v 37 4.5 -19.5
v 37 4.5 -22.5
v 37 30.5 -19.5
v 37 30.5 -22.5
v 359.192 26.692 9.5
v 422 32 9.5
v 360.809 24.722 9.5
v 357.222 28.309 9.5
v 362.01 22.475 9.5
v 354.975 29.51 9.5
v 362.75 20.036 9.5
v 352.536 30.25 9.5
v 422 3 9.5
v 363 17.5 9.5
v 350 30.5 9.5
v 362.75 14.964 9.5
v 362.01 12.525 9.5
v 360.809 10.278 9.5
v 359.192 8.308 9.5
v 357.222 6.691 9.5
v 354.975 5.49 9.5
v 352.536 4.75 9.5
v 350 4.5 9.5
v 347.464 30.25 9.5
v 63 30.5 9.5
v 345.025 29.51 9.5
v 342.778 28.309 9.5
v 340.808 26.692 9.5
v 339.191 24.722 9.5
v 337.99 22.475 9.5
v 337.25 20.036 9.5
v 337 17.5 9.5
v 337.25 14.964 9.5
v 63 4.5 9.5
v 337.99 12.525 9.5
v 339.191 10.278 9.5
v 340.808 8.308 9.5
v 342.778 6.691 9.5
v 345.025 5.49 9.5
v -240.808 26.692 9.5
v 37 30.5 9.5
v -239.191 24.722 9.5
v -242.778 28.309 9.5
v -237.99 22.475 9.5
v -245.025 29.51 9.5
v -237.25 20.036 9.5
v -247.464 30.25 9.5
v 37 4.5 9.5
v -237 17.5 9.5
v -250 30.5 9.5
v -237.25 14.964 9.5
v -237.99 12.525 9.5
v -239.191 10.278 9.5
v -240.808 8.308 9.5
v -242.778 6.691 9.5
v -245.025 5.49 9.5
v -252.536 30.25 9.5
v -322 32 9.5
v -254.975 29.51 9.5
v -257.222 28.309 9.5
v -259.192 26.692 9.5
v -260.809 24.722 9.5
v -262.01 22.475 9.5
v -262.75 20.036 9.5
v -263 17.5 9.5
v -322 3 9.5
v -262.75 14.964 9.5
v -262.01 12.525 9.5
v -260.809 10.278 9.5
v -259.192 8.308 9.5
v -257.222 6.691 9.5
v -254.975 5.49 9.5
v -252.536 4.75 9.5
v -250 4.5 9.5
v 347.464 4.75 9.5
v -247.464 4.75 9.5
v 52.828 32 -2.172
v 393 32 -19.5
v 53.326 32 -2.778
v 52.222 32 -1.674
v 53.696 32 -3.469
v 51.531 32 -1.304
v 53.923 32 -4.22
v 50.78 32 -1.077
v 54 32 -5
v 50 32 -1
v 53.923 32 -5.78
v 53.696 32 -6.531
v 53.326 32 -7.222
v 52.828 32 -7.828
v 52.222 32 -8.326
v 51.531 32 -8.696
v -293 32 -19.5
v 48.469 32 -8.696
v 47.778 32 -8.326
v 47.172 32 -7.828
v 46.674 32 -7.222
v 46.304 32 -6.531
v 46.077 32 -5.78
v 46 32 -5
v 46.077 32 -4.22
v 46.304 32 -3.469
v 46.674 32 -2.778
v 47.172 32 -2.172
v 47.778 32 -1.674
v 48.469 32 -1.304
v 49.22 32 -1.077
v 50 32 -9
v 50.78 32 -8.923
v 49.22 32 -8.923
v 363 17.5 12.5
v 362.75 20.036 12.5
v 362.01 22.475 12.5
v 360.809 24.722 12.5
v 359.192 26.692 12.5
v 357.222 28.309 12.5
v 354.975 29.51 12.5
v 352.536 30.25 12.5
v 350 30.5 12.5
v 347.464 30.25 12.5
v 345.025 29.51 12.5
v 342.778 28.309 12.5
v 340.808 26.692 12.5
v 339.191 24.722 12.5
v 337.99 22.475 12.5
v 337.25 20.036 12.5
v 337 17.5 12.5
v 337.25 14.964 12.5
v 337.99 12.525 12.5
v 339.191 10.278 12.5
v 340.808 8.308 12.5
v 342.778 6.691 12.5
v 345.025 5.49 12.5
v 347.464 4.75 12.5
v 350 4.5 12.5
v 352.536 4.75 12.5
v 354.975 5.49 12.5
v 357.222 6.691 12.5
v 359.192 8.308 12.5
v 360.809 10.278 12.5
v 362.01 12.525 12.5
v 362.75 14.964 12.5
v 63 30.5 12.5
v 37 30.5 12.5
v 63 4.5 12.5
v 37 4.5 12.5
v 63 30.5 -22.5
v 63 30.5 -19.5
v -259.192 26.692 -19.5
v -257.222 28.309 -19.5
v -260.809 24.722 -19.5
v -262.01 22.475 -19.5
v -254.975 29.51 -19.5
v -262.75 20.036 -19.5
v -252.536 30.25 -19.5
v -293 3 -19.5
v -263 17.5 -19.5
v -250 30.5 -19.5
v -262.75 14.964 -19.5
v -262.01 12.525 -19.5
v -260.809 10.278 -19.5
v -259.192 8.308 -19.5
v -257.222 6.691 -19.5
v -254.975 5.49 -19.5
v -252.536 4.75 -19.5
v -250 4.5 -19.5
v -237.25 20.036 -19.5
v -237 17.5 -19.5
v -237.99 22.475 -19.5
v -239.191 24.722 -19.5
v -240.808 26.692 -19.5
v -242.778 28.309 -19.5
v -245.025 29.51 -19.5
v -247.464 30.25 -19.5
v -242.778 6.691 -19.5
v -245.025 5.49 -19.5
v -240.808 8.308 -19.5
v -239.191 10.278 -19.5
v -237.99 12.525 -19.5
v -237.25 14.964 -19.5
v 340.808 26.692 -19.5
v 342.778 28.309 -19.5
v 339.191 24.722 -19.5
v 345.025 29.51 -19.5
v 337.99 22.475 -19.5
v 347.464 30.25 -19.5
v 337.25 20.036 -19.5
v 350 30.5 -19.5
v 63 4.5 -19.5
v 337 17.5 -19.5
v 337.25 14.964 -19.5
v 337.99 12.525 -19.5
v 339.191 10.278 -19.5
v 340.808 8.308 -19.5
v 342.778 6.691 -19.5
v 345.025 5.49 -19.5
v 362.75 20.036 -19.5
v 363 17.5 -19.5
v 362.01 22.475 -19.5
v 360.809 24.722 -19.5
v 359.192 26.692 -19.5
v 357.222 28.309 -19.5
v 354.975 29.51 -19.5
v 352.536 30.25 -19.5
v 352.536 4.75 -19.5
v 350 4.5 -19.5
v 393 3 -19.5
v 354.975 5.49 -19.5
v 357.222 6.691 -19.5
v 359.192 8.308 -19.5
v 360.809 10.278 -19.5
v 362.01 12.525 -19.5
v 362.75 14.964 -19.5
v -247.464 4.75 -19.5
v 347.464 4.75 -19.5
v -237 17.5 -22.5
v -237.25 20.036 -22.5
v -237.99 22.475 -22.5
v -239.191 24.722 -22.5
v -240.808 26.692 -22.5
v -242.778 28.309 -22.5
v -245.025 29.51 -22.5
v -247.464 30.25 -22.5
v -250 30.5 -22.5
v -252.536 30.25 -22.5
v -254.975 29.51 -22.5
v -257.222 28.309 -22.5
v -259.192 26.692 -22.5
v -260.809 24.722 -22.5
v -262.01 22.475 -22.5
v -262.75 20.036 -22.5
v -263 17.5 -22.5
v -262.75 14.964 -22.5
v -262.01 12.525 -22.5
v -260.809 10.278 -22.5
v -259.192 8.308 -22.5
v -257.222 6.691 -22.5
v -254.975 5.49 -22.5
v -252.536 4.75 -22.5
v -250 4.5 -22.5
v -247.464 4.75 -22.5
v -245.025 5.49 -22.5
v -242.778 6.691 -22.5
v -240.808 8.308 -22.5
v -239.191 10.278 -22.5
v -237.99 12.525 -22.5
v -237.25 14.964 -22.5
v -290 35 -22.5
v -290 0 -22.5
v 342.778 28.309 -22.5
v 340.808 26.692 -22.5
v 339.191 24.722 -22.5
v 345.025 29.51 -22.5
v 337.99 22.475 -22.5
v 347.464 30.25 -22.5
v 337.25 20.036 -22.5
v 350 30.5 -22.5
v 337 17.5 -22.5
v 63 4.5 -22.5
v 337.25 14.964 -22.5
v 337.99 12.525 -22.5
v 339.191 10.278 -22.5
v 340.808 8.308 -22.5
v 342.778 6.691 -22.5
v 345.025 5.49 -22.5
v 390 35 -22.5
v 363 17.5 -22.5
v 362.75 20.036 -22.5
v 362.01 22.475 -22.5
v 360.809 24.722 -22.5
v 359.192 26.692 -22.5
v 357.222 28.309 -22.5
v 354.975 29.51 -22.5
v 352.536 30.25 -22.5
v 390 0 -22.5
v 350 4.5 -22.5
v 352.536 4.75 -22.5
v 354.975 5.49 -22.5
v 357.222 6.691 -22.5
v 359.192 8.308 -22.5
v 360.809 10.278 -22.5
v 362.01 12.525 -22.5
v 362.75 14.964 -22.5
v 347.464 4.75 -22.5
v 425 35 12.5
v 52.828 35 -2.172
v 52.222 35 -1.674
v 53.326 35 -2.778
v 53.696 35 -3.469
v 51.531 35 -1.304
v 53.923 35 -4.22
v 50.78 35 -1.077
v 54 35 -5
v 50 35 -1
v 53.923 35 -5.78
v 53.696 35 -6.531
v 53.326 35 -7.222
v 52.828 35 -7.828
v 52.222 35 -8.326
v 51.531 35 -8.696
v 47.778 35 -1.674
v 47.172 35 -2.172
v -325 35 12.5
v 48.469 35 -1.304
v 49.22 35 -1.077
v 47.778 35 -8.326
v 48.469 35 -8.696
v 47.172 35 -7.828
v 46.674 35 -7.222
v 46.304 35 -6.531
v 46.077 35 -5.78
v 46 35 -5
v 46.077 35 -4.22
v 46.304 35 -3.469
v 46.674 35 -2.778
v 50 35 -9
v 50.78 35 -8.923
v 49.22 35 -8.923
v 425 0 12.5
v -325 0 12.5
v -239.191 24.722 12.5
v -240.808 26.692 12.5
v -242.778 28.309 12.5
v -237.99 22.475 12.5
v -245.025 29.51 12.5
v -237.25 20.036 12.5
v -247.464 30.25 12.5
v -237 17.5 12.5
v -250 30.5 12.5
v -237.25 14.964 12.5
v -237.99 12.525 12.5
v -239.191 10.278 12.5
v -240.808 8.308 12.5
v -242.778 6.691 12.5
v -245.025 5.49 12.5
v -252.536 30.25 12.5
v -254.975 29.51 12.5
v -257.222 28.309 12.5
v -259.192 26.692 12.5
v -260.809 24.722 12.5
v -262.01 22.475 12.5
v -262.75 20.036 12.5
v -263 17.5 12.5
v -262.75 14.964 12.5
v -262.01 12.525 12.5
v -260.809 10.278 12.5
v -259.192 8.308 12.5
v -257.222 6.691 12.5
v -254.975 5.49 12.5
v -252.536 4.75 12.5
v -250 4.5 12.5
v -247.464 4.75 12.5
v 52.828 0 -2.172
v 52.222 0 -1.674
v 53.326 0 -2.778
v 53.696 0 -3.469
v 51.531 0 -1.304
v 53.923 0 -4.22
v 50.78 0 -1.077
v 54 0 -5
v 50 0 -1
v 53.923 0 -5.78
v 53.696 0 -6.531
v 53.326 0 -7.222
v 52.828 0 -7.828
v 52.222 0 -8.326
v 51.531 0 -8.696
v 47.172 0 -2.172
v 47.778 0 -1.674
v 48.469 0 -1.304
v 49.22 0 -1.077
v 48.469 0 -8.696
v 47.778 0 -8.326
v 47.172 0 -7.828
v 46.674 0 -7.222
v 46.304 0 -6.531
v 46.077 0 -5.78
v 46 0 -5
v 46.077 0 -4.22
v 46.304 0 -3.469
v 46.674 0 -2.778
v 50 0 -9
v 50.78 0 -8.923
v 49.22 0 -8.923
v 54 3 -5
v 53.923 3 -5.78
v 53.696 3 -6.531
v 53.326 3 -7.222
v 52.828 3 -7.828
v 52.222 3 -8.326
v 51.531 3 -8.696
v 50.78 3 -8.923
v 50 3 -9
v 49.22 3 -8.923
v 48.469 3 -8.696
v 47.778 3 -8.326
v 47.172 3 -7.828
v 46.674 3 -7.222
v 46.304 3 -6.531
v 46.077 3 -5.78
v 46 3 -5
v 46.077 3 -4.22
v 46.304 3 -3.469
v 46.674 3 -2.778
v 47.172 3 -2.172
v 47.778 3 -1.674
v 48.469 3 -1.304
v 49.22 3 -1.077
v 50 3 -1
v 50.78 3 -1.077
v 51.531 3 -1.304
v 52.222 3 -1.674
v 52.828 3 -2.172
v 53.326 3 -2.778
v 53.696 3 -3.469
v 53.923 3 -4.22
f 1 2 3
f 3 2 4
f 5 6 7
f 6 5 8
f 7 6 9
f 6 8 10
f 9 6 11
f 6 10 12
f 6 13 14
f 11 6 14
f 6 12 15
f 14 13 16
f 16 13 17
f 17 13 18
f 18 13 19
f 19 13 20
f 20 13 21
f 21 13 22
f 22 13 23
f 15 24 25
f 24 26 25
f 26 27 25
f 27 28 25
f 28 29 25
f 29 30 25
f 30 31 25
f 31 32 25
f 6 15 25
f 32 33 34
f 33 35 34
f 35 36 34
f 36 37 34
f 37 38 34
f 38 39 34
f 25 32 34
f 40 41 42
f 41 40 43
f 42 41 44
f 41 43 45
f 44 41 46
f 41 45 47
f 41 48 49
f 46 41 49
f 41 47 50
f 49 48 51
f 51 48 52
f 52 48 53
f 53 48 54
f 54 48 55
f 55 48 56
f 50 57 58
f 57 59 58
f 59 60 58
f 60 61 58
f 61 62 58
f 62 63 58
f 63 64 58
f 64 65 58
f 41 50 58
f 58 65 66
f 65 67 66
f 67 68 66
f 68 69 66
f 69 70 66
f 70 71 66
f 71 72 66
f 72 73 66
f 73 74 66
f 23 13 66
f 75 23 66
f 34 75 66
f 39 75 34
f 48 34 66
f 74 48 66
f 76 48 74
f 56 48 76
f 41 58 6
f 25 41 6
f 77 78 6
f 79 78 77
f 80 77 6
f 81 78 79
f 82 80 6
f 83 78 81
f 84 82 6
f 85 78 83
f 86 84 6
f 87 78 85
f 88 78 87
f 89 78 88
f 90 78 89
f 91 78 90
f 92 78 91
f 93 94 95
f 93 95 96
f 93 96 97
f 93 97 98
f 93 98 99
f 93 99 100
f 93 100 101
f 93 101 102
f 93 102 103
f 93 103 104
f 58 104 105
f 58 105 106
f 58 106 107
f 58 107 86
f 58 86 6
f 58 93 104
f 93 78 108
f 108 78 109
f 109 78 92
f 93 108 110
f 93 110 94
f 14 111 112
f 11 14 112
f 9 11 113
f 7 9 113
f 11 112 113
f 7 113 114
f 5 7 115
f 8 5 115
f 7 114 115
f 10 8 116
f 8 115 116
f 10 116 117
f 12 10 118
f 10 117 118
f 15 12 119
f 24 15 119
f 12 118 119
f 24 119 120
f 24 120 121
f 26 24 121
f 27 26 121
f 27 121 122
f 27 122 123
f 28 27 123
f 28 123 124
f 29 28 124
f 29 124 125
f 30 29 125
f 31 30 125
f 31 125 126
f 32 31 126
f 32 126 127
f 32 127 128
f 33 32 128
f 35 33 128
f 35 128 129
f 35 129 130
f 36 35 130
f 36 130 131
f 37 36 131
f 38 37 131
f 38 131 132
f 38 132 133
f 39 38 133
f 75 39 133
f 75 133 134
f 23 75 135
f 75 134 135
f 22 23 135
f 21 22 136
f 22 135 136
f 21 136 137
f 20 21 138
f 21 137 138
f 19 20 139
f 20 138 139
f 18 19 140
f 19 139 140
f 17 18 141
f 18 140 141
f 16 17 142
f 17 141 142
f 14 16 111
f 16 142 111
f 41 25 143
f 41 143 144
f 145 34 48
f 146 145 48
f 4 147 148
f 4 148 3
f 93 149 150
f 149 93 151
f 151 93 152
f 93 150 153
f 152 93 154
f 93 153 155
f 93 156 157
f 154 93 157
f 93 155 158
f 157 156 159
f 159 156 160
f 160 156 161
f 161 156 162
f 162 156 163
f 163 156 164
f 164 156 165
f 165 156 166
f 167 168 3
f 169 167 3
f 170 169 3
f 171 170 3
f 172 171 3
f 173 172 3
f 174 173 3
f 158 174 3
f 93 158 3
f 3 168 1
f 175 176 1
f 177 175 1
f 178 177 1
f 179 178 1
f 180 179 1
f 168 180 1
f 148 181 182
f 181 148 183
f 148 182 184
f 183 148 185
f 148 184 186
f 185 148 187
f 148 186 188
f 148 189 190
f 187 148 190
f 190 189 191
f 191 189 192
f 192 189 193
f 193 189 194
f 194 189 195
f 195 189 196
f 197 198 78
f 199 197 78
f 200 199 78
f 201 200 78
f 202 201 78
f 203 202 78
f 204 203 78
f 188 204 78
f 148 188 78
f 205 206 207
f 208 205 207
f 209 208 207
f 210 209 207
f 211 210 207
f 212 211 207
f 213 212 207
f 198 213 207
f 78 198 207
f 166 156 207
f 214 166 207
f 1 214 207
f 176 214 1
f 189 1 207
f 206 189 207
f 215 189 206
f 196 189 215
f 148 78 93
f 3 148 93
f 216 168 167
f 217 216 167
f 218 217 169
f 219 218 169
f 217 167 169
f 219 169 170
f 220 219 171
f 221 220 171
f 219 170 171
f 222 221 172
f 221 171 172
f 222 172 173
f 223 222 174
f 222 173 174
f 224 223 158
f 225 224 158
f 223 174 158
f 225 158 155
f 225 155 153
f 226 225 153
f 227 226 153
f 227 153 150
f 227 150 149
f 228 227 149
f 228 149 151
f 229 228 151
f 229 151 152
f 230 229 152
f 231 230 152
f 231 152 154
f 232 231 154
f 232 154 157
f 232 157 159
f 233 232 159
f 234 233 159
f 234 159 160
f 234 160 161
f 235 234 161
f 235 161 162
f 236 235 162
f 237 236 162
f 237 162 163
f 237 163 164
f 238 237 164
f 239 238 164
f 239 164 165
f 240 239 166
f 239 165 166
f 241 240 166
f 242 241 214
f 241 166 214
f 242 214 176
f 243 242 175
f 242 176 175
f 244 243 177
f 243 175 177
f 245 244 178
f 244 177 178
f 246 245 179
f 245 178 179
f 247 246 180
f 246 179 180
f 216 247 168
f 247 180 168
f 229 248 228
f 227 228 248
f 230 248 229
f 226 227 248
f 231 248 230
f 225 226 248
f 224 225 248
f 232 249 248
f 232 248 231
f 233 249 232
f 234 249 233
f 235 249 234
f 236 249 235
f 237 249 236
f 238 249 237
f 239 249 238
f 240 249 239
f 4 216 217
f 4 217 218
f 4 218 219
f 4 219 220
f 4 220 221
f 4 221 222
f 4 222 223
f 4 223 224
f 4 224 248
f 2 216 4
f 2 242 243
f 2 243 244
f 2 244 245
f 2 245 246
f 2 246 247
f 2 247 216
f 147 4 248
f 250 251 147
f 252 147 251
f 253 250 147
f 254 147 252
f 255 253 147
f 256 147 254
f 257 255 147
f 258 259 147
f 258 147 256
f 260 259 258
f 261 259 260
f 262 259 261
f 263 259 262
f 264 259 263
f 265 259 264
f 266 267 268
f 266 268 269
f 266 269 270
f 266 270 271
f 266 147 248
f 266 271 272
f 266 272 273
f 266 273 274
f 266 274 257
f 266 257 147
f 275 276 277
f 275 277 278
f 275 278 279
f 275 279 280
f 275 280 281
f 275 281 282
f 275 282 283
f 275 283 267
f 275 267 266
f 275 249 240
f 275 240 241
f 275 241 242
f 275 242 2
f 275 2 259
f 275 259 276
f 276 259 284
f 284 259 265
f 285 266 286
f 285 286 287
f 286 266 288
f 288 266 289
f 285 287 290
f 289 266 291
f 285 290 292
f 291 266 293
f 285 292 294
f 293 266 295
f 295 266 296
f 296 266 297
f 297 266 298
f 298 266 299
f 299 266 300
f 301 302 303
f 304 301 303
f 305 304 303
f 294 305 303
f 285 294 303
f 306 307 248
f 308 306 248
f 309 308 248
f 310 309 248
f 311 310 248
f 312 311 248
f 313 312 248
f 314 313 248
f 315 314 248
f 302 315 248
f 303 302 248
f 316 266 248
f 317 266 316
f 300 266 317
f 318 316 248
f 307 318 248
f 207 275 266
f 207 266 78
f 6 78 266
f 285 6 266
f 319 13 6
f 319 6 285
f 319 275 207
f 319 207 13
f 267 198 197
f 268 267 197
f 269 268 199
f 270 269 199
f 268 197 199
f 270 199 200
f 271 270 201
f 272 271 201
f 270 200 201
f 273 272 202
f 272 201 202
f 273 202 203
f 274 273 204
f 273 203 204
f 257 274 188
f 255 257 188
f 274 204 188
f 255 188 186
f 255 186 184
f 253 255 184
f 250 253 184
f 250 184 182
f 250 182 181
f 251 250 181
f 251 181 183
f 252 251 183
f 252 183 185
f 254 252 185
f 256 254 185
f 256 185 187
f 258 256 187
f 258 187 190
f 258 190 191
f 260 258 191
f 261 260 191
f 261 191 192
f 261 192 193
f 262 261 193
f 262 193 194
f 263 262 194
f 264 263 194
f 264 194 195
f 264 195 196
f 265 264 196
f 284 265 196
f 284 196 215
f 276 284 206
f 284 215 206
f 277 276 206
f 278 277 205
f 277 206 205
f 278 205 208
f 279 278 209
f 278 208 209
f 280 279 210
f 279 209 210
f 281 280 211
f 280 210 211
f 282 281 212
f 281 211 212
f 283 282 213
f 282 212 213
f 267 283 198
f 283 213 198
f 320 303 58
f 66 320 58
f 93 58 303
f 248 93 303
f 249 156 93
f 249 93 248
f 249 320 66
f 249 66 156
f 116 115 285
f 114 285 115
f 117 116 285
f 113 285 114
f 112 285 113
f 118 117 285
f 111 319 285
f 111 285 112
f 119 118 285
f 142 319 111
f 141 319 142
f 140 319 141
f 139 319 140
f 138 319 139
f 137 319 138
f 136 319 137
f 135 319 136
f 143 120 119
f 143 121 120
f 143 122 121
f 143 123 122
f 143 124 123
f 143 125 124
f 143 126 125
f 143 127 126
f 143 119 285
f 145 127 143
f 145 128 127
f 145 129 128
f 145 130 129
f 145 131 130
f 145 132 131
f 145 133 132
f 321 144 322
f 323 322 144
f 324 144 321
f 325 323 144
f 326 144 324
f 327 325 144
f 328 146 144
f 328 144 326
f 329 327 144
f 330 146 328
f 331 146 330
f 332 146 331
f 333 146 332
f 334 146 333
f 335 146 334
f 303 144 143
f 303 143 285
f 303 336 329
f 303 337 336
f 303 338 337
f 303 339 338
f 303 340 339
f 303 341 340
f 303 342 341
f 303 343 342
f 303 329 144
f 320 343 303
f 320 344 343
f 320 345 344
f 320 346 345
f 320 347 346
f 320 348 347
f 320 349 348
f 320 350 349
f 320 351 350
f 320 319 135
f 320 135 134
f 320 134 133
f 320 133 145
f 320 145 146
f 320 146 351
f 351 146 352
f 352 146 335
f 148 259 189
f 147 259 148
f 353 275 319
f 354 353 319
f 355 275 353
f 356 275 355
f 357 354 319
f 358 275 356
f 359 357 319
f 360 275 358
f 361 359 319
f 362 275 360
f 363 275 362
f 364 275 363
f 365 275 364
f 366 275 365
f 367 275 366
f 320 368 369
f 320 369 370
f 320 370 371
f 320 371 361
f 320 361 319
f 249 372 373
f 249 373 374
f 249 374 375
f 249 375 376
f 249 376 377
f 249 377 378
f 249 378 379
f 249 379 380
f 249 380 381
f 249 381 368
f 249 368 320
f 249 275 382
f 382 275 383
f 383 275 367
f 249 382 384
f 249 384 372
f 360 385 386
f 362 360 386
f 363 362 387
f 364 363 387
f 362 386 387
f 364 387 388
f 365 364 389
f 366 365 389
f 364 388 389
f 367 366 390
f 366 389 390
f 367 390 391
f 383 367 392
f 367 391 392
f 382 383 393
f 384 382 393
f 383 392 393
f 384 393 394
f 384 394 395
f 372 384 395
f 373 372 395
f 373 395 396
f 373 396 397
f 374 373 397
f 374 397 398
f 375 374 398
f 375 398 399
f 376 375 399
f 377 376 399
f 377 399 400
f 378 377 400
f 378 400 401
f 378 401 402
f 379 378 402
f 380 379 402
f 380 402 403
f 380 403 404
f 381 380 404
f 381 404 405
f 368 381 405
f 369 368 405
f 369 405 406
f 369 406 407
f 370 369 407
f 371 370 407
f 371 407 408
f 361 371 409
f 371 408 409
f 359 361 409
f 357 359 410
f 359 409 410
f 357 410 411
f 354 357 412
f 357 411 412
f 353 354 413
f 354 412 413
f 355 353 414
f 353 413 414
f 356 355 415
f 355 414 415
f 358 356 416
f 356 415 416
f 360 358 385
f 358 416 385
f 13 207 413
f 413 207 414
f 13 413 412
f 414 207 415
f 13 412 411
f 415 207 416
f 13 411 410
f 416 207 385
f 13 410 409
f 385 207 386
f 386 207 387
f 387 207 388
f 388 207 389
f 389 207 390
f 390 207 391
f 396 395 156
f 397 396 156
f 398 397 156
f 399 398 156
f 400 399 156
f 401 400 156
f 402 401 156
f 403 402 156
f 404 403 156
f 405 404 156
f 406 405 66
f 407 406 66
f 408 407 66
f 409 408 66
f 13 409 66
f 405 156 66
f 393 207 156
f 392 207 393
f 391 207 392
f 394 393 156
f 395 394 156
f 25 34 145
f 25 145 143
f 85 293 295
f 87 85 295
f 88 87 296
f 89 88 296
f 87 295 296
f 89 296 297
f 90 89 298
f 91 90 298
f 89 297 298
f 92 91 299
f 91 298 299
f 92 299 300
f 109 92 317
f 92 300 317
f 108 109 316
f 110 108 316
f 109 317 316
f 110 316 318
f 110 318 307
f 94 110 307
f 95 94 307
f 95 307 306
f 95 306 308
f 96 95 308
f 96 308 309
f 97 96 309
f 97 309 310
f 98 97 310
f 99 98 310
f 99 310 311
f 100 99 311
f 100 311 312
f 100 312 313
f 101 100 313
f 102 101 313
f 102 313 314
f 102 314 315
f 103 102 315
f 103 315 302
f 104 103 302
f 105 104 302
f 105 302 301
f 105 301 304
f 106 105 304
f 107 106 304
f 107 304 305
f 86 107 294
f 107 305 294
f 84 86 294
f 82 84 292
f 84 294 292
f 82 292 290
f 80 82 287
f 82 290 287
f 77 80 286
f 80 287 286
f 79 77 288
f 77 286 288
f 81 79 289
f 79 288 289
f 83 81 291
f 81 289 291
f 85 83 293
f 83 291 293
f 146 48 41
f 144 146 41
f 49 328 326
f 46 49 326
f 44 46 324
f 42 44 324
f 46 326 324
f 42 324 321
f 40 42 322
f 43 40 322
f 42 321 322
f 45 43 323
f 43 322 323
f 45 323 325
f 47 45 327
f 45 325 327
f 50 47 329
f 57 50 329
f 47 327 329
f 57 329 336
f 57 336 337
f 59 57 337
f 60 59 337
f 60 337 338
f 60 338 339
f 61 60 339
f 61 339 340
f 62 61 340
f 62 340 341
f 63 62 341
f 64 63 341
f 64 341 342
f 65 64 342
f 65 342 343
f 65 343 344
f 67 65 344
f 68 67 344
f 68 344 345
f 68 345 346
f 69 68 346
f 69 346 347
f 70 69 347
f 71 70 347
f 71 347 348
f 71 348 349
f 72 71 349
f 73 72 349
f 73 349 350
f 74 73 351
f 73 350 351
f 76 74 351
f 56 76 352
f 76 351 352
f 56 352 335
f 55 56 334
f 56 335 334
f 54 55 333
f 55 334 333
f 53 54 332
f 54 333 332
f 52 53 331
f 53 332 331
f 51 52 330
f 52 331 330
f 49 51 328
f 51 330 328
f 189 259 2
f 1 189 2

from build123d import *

# Parameters (mm, degrees)
BOSS_EXTRUDE1_DEPTH = 35
SHELL1_T            = -3
SKETCH4_R           = 13
CUT_EXTRUDE1_DEPTH  = 49
SKETCH5_W           = 26
SKETCH5_H           = 26
CUT_EXTRUDE2_DEPTH  = 39
SKETCH6_R           = 4
CUT_EXTRUDE3_DEPTH  = 35


with BuildPart() as part:
    # Sketch1 → Boss-Extrude1 (new body)
    with BuildSketch(Plane(origin=(0, 0, 0), x_dir=(1, 0, 0), z_dir=(0, 1, 0))):
        Polygon((-325, -12.5), (-290, 22.5), (390, 22.5), (425, -12.5), align=None)
    extrude(amount=BOSS_EXTRUDE1_DEPTH)

    # Shell1
    shell1_openings = [part.faces().sort_by_distance(p)[0] for p in [
        (-307.5, 17.5, -5),
        (407.5, 17.5, -5),
    ]]
    offset(amount=SHELL1_T, openings=shell1_openings, kind=Kind.INTERSECTION)

    # Sketch4 → Cut-Extrude1 (cut)
    with BuildSketch(Plane.XY.offset(12.5)):
        with Locations((-250, 17.5)):
            Circle(SKETCH4_R)
        with Locations((350, 17.5)):
            Circle(SKETCH4_R)
    extrude(amount=-CUT_EXTRUDE1_DEPTH, mode=Mode.SUBTRACT)

    # Sketch5 → Cut-Extrude2 (cut)
    with BuildSketch(Plane(origin=(0, 0, -22.5), x_dir=(-1, 0, 0), z_dir=(0, 0, -1))):
        with Locations((-50, 17.5)):
            Rectangle(SKETCH5_W, SKETCH5_H)
    extrude(amount=-CUT_EXTRUDE2_DEPTH, mode=Mode.SUBTRACT)

    # Sketch6 → Cut-Extrude3 (cut)
    with BuildSketch(Plane(origin=(0, 35, 0), x_dir=(1, 0, 0), z_dir=(0, 1, 0))):
        with Locations((50, 5)):
            Circle(SKETCH6_R)
    extrude(amount=-CUT_EXTRUDE3_DEPTH, mode=Mode.SUBTRACT)


solid = part.part
